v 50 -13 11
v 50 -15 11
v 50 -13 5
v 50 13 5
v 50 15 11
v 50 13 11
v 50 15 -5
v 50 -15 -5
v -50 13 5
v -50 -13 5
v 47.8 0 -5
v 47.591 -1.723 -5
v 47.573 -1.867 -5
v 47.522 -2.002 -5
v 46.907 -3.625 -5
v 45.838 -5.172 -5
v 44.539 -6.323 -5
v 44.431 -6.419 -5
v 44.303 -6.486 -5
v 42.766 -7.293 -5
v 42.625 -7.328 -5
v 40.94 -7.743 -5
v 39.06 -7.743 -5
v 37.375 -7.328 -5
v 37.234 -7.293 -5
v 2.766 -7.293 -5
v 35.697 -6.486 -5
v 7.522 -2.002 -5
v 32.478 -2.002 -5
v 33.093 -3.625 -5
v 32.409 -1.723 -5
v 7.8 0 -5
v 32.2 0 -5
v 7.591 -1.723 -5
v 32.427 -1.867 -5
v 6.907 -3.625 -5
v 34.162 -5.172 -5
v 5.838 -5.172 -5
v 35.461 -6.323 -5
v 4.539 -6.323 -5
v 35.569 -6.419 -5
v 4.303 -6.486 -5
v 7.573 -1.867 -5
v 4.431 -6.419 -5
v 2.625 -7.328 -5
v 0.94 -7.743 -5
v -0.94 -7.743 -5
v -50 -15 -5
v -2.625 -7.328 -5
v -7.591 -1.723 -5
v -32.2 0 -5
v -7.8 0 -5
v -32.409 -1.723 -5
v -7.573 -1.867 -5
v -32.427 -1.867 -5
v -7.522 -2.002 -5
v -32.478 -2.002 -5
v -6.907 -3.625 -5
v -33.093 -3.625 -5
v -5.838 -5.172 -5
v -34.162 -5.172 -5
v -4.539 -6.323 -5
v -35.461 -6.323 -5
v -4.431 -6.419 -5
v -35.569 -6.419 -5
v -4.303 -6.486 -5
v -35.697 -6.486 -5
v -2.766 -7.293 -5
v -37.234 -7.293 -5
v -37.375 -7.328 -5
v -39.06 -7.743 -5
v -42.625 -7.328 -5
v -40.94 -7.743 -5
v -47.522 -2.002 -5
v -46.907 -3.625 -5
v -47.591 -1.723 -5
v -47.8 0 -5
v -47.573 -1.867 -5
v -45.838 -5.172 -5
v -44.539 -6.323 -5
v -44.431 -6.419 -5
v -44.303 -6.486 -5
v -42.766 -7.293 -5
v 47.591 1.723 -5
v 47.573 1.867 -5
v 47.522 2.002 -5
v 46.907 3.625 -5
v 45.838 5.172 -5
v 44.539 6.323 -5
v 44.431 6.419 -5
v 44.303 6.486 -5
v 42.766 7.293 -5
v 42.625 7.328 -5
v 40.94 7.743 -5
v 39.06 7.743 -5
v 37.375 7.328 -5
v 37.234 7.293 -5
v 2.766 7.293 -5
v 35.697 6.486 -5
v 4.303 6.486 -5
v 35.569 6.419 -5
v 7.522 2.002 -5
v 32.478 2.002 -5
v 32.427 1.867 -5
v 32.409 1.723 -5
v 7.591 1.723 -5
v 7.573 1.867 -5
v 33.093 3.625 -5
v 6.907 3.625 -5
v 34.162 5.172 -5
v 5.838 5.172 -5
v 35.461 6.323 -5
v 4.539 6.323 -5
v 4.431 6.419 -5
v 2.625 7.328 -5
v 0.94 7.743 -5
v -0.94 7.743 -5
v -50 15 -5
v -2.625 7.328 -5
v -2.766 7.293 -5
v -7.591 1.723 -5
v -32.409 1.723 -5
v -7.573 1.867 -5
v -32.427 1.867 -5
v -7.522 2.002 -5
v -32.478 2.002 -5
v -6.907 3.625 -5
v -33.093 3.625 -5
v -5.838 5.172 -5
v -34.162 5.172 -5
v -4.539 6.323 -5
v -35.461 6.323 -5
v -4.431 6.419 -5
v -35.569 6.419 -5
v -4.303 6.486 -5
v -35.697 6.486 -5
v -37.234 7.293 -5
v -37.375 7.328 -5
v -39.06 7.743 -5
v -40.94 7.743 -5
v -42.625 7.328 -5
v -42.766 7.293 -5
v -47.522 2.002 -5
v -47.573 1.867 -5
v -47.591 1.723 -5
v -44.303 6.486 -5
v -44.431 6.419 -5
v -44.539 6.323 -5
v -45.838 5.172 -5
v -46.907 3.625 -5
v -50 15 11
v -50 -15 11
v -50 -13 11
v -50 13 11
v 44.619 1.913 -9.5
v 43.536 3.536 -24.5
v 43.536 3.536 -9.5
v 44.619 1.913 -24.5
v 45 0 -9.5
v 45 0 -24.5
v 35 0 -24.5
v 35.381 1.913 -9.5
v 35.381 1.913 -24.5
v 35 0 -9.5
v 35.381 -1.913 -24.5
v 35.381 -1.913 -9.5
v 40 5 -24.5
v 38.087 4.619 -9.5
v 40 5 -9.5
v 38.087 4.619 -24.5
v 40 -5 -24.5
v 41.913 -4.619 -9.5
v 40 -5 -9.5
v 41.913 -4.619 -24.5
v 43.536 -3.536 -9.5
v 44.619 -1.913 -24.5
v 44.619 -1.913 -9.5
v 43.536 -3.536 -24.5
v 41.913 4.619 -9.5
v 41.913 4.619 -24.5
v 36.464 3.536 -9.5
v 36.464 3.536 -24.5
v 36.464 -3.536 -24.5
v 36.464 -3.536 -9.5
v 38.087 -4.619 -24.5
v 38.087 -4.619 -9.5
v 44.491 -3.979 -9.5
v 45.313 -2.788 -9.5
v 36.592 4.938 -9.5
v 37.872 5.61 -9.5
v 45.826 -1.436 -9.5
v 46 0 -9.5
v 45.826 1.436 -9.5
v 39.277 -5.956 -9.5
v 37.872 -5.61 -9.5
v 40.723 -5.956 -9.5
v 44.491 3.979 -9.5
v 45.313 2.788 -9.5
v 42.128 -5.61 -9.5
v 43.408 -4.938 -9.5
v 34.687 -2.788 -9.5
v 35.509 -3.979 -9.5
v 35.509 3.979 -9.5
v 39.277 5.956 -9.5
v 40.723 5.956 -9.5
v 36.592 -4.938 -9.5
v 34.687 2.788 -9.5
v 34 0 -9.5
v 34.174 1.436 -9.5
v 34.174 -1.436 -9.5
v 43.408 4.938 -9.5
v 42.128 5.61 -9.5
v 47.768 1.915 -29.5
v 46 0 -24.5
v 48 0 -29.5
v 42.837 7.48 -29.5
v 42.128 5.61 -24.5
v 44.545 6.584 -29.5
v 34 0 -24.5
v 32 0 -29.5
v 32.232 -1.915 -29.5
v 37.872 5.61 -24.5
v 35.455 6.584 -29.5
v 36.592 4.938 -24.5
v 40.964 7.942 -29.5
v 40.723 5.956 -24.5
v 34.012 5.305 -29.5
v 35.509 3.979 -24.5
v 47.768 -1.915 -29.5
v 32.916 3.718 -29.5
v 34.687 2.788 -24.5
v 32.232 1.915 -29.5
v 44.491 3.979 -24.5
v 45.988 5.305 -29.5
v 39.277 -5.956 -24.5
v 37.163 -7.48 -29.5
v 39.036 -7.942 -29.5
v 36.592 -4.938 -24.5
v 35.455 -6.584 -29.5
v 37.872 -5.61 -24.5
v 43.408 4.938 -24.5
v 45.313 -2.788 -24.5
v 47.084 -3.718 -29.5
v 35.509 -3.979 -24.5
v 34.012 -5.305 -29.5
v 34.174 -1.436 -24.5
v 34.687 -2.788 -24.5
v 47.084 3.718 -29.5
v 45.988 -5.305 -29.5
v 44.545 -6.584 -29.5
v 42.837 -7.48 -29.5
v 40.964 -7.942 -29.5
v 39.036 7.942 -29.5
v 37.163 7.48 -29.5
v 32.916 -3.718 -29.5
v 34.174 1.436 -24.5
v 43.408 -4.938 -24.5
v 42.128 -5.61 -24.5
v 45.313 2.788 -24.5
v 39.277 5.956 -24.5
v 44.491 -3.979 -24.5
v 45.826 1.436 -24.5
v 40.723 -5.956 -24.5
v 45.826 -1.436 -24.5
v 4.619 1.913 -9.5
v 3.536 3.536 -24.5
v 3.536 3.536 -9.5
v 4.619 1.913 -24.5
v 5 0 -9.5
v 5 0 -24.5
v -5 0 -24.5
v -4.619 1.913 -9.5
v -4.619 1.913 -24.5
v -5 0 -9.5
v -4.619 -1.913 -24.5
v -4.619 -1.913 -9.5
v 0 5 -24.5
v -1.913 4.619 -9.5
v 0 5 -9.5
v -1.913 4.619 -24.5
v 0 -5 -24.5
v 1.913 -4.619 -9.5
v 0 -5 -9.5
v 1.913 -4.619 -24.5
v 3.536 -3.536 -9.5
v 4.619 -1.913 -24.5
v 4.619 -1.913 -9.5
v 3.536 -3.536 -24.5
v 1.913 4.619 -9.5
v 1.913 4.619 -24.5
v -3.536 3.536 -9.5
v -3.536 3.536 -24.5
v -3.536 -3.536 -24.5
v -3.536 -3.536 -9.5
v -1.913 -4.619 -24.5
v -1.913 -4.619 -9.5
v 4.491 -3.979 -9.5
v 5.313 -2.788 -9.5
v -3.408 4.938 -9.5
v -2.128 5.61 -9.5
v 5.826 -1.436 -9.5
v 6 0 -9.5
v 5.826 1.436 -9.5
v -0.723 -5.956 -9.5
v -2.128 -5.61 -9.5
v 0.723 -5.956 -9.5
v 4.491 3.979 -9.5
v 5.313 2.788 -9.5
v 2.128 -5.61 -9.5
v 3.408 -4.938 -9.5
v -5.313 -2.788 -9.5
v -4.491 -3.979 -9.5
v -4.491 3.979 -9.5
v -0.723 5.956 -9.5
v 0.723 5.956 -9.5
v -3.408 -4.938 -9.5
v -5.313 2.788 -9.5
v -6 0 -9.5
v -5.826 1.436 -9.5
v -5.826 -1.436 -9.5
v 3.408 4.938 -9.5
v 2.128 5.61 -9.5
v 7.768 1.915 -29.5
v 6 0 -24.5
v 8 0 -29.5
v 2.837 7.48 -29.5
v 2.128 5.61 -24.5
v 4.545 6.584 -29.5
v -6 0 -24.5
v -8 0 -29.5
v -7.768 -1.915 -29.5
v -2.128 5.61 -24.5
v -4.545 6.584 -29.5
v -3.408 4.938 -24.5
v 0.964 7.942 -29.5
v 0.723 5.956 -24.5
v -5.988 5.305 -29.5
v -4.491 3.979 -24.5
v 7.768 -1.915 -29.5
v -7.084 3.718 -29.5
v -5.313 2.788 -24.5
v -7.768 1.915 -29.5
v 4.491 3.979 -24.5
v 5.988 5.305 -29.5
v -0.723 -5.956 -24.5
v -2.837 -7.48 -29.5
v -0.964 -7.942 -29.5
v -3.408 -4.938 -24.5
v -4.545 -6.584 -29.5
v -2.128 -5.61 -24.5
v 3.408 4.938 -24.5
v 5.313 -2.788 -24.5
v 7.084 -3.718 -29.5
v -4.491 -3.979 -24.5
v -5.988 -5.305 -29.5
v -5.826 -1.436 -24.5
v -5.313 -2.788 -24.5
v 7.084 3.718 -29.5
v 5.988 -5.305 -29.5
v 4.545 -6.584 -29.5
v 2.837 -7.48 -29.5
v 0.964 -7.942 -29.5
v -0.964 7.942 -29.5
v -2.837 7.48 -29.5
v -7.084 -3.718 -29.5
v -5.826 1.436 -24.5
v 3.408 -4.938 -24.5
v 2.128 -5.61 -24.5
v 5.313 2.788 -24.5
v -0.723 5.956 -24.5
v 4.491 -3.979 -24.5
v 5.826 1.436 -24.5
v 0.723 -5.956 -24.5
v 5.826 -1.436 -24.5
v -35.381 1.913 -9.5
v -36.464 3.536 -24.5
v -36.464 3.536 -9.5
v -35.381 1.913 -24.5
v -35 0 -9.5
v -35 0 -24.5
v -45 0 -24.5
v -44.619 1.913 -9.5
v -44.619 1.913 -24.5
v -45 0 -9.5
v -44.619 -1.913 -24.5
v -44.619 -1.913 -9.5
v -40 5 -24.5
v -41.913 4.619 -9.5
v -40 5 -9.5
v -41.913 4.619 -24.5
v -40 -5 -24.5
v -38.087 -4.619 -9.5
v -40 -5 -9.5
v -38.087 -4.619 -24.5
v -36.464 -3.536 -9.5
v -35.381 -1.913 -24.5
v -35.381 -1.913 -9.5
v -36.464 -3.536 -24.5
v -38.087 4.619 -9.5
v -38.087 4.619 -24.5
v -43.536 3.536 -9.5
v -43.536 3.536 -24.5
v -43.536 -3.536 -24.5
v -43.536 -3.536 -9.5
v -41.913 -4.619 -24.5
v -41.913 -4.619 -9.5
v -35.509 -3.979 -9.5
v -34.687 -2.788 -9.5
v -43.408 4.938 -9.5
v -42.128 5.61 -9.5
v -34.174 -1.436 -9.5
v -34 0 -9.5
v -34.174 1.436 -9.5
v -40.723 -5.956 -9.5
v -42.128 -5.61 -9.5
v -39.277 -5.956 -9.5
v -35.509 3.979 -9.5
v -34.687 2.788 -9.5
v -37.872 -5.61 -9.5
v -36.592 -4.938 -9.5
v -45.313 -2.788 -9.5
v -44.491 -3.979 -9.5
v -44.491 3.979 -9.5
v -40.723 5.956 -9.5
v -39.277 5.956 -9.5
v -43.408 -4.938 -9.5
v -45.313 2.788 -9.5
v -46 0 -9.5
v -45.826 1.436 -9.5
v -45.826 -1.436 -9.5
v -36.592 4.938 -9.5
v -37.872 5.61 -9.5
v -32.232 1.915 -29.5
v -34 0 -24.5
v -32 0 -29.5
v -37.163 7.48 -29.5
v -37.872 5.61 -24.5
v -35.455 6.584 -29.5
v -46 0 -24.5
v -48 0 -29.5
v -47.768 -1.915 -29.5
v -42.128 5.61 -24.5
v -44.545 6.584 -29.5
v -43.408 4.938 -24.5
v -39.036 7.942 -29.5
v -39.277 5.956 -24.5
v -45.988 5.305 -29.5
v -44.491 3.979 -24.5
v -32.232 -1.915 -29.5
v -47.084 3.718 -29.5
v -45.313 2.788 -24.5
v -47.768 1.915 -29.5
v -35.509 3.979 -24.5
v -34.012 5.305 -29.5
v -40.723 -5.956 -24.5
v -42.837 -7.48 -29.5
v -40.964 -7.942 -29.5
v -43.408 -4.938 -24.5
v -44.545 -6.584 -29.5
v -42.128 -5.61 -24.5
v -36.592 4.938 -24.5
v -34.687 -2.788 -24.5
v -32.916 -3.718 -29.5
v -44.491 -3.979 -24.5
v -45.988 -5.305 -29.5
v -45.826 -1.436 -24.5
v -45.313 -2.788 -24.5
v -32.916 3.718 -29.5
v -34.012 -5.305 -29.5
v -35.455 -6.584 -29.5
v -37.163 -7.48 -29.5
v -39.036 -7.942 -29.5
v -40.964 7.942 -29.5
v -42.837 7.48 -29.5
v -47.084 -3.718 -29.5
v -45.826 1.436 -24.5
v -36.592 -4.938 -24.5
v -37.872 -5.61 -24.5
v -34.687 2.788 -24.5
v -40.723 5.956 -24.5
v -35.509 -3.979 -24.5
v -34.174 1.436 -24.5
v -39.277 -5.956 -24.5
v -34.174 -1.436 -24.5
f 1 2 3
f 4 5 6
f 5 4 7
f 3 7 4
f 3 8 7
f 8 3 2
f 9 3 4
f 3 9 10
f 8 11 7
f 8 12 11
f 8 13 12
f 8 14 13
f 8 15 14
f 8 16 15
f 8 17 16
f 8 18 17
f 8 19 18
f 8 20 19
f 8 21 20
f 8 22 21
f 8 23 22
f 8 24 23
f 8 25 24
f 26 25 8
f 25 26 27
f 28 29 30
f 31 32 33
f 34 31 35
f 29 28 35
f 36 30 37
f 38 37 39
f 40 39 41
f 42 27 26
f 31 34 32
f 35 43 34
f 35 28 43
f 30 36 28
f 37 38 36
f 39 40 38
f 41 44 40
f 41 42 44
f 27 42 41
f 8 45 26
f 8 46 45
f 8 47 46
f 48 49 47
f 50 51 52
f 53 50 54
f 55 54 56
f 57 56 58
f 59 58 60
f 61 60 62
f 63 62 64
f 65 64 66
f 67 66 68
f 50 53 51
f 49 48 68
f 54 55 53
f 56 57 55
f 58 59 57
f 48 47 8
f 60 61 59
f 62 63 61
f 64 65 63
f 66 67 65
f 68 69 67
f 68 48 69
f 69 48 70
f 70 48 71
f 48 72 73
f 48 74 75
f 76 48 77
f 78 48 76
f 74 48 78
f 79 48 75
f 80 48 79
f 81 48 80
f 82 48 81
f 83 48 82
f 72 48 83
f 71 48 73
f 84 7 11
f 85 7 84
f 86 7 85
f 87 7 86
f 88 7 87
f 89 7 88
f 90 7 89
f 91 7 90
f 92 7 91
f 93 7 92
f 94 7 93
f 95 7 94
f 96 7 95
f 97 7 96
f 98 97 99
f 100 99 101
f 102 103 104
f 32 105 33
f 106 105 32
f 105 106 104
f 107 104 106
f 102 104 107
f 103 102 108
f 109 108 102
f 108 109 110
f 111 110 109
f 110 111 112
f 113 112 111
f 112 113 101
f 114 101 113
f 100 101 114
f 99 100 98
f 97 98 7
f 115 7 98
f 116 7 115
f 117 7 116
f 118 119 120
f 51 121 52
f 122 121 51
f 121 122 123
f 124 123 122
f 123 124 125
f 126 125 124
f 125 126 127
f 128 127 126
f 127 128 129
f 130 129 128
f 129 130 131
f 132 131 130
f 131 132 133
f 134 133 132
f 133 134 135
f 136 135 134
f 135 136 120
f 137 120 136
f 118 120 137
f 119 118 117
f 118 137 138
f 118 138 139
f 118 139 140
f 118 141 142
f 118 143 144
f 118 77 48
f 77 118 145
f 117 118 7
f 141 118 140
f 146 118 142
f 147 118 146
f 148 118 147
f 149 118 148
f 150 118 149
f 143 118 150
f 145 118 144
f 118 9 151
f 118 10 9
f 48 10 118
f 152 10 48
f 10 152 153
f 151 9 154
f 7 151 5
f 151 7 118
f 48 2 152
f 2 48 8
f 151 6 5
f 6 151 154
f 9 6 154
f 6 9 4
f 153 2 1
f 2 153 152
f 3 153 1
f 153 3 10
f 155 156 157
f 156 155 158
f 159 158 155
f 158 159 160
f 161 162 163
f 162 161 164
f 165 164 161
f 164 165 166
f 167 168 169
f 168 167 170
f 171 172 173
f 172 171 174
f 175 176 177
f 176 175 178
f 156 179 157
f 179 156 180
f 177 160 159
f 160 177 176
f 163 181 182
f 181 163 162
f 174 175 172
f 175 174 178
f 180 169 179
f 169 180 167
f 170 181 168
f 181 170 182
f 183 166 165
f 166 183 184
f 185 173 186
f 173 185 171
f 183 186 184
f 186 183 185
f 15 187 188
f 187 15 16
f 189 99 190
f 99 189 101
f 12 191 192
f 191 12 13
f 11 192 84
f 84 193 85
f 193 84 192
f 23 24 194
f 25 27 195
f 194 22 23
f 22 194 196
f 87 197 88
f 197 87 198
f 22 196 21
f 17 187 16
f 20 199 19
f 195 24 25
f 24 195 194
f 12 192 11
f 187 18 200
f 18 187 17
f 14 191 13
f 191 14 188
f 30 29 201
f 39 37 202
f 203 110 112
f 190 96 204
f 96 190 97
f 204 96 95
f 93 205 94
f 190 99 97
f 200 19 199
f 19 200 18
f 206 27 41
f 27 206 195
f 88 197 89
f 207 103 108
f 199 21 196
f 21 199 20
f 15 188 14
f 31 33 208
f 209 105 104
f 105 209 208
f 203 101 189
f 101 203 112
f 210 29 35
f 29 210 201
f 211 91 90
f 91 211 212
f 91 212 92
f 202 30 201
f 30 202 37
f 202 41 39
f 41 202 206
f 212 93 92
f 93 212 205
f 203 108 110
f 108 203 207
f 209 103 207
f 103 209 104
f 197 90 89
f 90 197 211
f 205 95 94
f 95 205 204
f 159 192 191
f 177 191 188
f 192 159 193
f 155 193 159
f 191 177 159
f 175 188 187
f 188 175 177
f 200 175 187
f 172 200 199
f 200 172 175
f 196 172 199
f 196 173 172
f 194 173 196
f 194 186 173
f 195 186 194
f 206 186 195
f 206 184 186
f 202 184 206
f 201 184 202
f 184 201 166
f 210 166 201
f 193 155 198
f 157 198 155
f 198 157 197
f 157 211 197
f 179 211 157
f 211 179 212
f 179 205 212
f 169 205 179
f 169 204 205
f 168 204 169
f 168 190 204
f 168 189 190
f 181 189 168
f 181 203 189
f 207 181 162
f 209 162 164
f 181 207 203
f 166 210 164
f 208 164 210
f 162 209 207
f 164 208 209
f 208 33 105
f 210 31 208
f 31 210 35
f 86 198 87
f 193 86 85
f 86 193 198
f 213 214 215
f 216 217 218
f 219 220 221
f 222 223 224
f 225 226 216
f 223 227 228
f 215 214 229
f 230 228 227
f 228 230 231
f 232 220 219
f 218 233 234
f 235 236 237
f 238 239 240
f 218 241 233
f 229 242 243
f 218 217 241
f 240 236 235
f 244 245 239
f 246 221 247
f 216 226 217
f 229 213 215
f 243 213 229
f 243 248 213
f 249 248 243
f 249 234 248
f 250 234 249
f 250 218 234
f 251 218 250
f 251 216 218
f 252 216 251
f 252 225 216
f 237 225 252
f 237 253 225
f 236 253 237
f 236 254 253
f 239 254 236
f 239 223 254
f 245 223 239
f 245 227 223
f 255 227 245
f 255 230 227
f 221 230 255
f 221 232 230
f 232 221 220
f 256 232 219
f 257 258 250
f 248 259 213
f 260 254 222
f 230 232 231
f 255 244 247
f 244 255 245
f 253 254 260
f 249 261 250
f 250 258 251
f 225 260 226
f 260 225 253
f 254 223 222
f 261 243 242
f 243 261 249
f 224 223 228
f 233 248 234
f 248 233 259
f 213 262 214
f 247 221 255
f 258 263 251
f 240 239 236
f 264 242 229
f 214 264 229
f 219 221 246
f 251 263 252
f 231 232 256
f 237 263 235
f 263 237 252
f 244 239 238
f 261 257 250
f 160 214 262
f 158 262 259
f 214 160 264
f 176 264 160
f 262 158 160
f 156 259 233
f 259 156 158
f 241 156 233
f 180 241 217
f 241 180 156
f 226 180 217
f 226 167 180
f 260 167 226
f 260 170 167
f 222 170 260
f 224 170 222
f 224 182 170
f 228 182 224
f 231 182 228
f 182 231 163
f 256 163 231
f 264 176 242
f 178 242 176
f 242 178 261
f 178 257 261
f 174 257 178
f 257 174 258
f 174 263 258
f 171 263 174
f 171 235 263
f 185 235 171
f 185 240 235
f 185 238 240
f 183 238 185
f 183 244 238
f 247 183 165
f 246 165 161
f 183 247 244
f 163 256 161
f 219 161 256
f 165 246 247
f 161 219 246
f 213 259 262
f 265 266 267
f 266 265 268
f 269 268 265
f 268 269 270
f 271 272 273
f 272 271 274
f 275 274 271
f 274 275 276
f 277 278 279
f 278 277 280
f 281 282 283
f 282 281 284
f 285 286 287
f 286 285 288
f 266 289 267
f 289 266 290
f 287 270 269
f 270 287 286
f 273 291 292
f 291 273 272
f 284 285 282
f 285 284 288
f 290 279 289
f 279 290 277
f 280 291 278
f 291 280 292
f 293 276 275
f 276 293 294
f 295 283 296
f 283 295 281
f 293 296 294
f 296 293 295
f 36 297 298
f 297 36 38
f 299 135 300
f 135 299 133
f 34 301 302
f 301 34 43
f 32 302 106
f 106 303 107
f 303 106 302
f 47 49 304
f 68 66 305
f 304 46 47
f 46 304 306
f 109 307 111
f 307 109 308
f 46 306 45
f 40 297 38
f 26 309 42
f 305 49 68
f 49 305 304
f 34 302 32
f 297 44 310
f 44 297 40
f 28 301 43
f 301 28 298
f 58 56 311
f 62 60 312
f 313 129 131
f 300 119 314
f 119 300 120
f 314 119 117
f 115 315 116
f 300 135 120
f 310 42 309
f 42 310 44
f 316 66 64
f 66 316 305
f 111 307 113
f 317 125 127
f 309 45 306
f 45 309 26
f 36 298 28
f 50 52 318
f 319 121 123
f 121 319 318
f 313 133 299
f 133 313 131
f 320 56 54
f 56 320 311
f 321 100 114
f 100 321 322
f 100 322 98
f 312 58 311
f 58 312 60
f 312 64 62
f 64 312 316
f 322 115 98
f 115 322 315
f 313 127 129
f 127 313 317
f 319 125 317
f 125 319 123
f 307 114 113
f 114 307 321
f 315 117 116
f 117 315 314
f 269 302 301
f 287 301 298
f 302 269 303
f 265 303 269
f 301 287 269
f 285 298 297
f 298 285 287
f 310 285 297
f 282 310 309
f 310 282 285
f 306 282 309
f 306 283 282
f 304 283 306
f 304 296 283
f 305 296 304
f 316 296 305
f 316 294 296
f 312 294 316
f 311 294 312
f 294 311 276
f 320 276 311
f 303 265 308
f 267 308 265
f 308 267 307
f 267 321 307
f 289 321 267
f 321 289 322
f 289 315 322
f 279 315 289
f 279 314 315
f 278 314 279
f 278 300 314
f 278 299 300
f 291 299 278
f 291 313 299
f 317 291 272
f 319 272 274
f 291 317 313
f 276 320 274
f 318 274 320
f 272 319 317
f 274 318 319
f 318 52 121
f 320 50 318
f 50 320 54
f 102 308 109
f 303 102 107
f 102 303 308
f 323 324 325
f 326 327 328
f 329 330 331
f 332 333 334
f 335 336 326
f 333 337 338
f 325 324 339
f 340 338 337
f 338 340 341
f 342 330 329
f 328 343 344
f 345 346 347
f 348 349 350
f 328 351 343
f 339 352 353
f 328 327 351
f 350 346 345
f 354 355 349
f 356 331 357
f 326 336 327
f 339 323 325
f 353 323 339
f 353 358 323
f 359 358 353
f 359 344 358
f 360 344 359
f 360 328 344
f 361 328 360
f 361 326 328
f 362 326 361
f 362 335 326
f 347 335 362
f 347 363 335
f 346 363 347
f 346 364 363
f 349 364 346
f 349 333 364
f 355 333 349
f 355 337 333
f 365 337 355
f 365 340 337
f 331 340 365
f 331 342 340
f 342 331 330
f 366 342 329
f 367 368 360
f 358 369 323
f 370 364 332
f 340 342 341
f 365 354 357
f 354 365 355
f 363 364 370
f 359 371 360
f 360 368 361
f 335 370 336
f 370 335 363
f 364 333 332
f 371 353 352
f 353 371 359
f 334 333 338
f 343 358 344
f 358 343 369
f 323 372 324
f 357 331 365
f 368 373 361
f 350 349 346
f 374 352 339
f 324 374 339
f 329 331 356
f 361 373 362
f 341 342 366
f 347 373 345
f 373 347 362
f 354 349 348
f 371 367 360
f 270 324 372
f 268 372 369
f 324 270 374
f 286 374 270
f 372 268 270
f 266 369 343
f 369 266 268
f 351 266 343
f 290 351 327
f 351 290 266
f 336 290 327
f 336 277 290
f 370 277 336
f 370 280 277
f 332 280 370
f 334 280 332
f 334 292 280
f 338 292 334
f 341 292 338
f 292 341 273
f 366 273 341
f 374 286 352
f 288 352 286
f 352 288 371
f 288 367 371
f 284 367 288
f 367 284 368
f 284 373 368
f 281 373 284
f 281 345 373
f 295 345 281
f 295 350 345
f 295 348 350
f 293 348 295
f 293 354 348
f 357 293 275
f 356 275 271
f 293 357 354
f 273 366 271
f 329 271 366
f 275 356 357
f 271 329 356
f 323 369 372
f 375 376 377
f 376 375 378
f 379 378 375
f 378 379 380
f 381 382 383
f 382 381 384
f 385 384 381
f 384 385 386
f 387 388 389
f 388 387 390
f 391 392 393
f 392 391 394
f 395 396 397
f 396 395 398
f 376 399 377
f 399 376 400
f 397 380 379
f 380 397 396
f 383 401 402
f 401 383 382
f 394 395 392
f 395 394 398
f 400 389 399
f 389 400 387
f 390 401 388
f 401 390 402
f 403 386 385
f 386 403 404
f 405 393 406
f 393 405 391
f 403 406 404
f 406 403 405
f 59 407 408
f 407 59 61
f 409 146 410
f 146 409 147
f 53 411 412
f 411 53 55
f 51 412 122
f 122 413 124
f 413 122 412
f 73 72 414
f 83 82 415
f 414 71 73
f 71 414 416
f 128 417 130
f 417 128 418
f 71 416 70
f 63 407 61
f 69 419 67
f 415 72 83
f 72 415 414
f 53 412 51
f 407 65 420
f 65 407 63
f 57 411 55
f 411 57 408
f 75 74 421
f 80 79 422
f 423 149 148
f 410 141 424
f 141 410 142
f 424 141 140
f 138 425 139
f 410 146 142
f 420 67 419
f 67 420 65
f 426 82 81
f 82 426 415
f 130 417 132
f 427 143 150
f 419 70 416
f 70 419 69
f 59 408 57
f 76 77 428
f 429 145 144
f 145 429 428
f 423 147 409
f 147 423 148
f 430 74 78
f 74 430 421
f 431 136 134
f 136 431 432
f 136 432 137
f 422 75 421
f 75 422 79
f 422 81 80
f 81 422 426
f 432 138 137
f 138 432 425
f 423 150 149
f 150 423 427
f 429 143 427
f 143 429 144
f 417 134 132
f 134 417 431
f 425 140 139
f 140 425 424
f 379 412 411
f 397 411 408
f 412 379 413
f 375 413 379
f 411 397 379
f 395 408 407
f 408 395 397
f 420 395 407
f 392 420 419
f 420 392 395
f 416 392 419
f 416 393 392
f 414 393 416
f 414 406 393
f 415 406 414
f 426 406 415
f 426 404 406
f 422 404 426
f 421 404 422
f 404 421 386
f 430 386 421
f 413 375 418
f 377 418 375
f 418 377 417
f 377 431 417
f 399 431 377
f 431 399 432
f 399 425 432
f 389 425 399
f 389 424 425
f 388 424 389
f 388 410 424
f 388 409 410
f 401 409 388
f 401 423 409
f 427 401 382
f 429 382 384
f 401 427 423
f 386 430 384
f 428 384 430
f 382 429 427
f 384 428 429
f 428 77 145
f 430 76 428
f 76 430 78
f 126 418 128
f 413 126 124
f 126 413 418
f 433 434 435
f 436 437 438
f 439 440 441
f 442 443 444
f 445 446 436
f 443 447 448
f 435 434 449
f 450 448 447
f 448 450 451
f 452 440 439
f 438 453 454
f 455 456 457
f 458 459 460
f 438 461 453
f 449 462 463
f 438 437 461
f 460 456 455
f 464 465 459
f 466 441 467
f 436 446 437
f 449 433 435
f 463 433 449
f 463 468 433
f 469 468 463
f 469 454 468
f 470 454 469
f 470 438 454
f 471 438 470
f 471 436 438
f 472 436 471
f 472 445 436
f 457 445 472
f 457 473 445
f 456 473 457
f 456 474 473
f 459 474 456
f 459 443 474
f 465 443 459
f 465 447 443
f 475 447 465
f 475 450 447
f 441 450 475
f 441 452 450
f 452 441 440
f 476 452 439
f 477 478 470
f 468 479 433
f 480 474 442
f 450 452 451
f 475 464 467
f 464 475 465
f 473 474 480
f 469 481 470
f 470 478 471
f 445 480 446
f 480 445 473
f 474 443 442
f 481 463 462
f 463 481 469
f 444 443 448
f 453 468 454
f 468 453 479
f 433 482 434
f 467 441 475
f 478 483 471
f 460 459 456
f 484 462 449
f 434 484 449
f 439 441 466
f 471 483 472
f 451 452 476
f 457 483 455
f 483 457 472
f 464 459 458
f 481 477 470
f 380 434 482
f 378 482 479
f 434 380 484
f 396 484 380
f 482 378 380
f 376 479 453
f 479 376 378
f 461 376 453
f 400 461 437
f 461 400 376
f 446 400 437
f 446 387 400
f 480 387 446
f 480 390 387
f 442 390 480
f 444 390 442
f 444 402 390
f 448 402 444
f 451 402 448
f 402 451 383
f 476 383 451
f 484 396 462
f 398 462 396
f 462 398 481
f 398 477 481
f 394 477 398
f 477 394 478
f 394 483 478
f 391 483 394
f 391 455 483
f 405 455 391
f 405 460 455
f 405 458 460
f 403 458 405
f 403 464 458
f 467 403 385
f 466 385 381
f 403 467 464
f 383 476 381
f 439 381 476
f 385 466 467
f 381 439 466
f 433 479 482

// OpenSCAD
bridge();

module bridge()
{
	road();
	translate([+40,0,-17])pillar();
	translate([0,0,-17])pillar();
	translate([-40,0,-17])pillar();
}

module road()
{	
	cube([100,30,10], true);
	translate([0,14,7.5])cube([100,2,7], true);
	translate([0,-14,7.5])cube([100,2,7], true);
}

module pillar()
{
	cylinder(20, 5, 5, true);
	translate([0,0,10])	cylinder(5, 6, 8, true);
	translate([0,0,-10])	cylinder(5, 8, 6, true);
}
